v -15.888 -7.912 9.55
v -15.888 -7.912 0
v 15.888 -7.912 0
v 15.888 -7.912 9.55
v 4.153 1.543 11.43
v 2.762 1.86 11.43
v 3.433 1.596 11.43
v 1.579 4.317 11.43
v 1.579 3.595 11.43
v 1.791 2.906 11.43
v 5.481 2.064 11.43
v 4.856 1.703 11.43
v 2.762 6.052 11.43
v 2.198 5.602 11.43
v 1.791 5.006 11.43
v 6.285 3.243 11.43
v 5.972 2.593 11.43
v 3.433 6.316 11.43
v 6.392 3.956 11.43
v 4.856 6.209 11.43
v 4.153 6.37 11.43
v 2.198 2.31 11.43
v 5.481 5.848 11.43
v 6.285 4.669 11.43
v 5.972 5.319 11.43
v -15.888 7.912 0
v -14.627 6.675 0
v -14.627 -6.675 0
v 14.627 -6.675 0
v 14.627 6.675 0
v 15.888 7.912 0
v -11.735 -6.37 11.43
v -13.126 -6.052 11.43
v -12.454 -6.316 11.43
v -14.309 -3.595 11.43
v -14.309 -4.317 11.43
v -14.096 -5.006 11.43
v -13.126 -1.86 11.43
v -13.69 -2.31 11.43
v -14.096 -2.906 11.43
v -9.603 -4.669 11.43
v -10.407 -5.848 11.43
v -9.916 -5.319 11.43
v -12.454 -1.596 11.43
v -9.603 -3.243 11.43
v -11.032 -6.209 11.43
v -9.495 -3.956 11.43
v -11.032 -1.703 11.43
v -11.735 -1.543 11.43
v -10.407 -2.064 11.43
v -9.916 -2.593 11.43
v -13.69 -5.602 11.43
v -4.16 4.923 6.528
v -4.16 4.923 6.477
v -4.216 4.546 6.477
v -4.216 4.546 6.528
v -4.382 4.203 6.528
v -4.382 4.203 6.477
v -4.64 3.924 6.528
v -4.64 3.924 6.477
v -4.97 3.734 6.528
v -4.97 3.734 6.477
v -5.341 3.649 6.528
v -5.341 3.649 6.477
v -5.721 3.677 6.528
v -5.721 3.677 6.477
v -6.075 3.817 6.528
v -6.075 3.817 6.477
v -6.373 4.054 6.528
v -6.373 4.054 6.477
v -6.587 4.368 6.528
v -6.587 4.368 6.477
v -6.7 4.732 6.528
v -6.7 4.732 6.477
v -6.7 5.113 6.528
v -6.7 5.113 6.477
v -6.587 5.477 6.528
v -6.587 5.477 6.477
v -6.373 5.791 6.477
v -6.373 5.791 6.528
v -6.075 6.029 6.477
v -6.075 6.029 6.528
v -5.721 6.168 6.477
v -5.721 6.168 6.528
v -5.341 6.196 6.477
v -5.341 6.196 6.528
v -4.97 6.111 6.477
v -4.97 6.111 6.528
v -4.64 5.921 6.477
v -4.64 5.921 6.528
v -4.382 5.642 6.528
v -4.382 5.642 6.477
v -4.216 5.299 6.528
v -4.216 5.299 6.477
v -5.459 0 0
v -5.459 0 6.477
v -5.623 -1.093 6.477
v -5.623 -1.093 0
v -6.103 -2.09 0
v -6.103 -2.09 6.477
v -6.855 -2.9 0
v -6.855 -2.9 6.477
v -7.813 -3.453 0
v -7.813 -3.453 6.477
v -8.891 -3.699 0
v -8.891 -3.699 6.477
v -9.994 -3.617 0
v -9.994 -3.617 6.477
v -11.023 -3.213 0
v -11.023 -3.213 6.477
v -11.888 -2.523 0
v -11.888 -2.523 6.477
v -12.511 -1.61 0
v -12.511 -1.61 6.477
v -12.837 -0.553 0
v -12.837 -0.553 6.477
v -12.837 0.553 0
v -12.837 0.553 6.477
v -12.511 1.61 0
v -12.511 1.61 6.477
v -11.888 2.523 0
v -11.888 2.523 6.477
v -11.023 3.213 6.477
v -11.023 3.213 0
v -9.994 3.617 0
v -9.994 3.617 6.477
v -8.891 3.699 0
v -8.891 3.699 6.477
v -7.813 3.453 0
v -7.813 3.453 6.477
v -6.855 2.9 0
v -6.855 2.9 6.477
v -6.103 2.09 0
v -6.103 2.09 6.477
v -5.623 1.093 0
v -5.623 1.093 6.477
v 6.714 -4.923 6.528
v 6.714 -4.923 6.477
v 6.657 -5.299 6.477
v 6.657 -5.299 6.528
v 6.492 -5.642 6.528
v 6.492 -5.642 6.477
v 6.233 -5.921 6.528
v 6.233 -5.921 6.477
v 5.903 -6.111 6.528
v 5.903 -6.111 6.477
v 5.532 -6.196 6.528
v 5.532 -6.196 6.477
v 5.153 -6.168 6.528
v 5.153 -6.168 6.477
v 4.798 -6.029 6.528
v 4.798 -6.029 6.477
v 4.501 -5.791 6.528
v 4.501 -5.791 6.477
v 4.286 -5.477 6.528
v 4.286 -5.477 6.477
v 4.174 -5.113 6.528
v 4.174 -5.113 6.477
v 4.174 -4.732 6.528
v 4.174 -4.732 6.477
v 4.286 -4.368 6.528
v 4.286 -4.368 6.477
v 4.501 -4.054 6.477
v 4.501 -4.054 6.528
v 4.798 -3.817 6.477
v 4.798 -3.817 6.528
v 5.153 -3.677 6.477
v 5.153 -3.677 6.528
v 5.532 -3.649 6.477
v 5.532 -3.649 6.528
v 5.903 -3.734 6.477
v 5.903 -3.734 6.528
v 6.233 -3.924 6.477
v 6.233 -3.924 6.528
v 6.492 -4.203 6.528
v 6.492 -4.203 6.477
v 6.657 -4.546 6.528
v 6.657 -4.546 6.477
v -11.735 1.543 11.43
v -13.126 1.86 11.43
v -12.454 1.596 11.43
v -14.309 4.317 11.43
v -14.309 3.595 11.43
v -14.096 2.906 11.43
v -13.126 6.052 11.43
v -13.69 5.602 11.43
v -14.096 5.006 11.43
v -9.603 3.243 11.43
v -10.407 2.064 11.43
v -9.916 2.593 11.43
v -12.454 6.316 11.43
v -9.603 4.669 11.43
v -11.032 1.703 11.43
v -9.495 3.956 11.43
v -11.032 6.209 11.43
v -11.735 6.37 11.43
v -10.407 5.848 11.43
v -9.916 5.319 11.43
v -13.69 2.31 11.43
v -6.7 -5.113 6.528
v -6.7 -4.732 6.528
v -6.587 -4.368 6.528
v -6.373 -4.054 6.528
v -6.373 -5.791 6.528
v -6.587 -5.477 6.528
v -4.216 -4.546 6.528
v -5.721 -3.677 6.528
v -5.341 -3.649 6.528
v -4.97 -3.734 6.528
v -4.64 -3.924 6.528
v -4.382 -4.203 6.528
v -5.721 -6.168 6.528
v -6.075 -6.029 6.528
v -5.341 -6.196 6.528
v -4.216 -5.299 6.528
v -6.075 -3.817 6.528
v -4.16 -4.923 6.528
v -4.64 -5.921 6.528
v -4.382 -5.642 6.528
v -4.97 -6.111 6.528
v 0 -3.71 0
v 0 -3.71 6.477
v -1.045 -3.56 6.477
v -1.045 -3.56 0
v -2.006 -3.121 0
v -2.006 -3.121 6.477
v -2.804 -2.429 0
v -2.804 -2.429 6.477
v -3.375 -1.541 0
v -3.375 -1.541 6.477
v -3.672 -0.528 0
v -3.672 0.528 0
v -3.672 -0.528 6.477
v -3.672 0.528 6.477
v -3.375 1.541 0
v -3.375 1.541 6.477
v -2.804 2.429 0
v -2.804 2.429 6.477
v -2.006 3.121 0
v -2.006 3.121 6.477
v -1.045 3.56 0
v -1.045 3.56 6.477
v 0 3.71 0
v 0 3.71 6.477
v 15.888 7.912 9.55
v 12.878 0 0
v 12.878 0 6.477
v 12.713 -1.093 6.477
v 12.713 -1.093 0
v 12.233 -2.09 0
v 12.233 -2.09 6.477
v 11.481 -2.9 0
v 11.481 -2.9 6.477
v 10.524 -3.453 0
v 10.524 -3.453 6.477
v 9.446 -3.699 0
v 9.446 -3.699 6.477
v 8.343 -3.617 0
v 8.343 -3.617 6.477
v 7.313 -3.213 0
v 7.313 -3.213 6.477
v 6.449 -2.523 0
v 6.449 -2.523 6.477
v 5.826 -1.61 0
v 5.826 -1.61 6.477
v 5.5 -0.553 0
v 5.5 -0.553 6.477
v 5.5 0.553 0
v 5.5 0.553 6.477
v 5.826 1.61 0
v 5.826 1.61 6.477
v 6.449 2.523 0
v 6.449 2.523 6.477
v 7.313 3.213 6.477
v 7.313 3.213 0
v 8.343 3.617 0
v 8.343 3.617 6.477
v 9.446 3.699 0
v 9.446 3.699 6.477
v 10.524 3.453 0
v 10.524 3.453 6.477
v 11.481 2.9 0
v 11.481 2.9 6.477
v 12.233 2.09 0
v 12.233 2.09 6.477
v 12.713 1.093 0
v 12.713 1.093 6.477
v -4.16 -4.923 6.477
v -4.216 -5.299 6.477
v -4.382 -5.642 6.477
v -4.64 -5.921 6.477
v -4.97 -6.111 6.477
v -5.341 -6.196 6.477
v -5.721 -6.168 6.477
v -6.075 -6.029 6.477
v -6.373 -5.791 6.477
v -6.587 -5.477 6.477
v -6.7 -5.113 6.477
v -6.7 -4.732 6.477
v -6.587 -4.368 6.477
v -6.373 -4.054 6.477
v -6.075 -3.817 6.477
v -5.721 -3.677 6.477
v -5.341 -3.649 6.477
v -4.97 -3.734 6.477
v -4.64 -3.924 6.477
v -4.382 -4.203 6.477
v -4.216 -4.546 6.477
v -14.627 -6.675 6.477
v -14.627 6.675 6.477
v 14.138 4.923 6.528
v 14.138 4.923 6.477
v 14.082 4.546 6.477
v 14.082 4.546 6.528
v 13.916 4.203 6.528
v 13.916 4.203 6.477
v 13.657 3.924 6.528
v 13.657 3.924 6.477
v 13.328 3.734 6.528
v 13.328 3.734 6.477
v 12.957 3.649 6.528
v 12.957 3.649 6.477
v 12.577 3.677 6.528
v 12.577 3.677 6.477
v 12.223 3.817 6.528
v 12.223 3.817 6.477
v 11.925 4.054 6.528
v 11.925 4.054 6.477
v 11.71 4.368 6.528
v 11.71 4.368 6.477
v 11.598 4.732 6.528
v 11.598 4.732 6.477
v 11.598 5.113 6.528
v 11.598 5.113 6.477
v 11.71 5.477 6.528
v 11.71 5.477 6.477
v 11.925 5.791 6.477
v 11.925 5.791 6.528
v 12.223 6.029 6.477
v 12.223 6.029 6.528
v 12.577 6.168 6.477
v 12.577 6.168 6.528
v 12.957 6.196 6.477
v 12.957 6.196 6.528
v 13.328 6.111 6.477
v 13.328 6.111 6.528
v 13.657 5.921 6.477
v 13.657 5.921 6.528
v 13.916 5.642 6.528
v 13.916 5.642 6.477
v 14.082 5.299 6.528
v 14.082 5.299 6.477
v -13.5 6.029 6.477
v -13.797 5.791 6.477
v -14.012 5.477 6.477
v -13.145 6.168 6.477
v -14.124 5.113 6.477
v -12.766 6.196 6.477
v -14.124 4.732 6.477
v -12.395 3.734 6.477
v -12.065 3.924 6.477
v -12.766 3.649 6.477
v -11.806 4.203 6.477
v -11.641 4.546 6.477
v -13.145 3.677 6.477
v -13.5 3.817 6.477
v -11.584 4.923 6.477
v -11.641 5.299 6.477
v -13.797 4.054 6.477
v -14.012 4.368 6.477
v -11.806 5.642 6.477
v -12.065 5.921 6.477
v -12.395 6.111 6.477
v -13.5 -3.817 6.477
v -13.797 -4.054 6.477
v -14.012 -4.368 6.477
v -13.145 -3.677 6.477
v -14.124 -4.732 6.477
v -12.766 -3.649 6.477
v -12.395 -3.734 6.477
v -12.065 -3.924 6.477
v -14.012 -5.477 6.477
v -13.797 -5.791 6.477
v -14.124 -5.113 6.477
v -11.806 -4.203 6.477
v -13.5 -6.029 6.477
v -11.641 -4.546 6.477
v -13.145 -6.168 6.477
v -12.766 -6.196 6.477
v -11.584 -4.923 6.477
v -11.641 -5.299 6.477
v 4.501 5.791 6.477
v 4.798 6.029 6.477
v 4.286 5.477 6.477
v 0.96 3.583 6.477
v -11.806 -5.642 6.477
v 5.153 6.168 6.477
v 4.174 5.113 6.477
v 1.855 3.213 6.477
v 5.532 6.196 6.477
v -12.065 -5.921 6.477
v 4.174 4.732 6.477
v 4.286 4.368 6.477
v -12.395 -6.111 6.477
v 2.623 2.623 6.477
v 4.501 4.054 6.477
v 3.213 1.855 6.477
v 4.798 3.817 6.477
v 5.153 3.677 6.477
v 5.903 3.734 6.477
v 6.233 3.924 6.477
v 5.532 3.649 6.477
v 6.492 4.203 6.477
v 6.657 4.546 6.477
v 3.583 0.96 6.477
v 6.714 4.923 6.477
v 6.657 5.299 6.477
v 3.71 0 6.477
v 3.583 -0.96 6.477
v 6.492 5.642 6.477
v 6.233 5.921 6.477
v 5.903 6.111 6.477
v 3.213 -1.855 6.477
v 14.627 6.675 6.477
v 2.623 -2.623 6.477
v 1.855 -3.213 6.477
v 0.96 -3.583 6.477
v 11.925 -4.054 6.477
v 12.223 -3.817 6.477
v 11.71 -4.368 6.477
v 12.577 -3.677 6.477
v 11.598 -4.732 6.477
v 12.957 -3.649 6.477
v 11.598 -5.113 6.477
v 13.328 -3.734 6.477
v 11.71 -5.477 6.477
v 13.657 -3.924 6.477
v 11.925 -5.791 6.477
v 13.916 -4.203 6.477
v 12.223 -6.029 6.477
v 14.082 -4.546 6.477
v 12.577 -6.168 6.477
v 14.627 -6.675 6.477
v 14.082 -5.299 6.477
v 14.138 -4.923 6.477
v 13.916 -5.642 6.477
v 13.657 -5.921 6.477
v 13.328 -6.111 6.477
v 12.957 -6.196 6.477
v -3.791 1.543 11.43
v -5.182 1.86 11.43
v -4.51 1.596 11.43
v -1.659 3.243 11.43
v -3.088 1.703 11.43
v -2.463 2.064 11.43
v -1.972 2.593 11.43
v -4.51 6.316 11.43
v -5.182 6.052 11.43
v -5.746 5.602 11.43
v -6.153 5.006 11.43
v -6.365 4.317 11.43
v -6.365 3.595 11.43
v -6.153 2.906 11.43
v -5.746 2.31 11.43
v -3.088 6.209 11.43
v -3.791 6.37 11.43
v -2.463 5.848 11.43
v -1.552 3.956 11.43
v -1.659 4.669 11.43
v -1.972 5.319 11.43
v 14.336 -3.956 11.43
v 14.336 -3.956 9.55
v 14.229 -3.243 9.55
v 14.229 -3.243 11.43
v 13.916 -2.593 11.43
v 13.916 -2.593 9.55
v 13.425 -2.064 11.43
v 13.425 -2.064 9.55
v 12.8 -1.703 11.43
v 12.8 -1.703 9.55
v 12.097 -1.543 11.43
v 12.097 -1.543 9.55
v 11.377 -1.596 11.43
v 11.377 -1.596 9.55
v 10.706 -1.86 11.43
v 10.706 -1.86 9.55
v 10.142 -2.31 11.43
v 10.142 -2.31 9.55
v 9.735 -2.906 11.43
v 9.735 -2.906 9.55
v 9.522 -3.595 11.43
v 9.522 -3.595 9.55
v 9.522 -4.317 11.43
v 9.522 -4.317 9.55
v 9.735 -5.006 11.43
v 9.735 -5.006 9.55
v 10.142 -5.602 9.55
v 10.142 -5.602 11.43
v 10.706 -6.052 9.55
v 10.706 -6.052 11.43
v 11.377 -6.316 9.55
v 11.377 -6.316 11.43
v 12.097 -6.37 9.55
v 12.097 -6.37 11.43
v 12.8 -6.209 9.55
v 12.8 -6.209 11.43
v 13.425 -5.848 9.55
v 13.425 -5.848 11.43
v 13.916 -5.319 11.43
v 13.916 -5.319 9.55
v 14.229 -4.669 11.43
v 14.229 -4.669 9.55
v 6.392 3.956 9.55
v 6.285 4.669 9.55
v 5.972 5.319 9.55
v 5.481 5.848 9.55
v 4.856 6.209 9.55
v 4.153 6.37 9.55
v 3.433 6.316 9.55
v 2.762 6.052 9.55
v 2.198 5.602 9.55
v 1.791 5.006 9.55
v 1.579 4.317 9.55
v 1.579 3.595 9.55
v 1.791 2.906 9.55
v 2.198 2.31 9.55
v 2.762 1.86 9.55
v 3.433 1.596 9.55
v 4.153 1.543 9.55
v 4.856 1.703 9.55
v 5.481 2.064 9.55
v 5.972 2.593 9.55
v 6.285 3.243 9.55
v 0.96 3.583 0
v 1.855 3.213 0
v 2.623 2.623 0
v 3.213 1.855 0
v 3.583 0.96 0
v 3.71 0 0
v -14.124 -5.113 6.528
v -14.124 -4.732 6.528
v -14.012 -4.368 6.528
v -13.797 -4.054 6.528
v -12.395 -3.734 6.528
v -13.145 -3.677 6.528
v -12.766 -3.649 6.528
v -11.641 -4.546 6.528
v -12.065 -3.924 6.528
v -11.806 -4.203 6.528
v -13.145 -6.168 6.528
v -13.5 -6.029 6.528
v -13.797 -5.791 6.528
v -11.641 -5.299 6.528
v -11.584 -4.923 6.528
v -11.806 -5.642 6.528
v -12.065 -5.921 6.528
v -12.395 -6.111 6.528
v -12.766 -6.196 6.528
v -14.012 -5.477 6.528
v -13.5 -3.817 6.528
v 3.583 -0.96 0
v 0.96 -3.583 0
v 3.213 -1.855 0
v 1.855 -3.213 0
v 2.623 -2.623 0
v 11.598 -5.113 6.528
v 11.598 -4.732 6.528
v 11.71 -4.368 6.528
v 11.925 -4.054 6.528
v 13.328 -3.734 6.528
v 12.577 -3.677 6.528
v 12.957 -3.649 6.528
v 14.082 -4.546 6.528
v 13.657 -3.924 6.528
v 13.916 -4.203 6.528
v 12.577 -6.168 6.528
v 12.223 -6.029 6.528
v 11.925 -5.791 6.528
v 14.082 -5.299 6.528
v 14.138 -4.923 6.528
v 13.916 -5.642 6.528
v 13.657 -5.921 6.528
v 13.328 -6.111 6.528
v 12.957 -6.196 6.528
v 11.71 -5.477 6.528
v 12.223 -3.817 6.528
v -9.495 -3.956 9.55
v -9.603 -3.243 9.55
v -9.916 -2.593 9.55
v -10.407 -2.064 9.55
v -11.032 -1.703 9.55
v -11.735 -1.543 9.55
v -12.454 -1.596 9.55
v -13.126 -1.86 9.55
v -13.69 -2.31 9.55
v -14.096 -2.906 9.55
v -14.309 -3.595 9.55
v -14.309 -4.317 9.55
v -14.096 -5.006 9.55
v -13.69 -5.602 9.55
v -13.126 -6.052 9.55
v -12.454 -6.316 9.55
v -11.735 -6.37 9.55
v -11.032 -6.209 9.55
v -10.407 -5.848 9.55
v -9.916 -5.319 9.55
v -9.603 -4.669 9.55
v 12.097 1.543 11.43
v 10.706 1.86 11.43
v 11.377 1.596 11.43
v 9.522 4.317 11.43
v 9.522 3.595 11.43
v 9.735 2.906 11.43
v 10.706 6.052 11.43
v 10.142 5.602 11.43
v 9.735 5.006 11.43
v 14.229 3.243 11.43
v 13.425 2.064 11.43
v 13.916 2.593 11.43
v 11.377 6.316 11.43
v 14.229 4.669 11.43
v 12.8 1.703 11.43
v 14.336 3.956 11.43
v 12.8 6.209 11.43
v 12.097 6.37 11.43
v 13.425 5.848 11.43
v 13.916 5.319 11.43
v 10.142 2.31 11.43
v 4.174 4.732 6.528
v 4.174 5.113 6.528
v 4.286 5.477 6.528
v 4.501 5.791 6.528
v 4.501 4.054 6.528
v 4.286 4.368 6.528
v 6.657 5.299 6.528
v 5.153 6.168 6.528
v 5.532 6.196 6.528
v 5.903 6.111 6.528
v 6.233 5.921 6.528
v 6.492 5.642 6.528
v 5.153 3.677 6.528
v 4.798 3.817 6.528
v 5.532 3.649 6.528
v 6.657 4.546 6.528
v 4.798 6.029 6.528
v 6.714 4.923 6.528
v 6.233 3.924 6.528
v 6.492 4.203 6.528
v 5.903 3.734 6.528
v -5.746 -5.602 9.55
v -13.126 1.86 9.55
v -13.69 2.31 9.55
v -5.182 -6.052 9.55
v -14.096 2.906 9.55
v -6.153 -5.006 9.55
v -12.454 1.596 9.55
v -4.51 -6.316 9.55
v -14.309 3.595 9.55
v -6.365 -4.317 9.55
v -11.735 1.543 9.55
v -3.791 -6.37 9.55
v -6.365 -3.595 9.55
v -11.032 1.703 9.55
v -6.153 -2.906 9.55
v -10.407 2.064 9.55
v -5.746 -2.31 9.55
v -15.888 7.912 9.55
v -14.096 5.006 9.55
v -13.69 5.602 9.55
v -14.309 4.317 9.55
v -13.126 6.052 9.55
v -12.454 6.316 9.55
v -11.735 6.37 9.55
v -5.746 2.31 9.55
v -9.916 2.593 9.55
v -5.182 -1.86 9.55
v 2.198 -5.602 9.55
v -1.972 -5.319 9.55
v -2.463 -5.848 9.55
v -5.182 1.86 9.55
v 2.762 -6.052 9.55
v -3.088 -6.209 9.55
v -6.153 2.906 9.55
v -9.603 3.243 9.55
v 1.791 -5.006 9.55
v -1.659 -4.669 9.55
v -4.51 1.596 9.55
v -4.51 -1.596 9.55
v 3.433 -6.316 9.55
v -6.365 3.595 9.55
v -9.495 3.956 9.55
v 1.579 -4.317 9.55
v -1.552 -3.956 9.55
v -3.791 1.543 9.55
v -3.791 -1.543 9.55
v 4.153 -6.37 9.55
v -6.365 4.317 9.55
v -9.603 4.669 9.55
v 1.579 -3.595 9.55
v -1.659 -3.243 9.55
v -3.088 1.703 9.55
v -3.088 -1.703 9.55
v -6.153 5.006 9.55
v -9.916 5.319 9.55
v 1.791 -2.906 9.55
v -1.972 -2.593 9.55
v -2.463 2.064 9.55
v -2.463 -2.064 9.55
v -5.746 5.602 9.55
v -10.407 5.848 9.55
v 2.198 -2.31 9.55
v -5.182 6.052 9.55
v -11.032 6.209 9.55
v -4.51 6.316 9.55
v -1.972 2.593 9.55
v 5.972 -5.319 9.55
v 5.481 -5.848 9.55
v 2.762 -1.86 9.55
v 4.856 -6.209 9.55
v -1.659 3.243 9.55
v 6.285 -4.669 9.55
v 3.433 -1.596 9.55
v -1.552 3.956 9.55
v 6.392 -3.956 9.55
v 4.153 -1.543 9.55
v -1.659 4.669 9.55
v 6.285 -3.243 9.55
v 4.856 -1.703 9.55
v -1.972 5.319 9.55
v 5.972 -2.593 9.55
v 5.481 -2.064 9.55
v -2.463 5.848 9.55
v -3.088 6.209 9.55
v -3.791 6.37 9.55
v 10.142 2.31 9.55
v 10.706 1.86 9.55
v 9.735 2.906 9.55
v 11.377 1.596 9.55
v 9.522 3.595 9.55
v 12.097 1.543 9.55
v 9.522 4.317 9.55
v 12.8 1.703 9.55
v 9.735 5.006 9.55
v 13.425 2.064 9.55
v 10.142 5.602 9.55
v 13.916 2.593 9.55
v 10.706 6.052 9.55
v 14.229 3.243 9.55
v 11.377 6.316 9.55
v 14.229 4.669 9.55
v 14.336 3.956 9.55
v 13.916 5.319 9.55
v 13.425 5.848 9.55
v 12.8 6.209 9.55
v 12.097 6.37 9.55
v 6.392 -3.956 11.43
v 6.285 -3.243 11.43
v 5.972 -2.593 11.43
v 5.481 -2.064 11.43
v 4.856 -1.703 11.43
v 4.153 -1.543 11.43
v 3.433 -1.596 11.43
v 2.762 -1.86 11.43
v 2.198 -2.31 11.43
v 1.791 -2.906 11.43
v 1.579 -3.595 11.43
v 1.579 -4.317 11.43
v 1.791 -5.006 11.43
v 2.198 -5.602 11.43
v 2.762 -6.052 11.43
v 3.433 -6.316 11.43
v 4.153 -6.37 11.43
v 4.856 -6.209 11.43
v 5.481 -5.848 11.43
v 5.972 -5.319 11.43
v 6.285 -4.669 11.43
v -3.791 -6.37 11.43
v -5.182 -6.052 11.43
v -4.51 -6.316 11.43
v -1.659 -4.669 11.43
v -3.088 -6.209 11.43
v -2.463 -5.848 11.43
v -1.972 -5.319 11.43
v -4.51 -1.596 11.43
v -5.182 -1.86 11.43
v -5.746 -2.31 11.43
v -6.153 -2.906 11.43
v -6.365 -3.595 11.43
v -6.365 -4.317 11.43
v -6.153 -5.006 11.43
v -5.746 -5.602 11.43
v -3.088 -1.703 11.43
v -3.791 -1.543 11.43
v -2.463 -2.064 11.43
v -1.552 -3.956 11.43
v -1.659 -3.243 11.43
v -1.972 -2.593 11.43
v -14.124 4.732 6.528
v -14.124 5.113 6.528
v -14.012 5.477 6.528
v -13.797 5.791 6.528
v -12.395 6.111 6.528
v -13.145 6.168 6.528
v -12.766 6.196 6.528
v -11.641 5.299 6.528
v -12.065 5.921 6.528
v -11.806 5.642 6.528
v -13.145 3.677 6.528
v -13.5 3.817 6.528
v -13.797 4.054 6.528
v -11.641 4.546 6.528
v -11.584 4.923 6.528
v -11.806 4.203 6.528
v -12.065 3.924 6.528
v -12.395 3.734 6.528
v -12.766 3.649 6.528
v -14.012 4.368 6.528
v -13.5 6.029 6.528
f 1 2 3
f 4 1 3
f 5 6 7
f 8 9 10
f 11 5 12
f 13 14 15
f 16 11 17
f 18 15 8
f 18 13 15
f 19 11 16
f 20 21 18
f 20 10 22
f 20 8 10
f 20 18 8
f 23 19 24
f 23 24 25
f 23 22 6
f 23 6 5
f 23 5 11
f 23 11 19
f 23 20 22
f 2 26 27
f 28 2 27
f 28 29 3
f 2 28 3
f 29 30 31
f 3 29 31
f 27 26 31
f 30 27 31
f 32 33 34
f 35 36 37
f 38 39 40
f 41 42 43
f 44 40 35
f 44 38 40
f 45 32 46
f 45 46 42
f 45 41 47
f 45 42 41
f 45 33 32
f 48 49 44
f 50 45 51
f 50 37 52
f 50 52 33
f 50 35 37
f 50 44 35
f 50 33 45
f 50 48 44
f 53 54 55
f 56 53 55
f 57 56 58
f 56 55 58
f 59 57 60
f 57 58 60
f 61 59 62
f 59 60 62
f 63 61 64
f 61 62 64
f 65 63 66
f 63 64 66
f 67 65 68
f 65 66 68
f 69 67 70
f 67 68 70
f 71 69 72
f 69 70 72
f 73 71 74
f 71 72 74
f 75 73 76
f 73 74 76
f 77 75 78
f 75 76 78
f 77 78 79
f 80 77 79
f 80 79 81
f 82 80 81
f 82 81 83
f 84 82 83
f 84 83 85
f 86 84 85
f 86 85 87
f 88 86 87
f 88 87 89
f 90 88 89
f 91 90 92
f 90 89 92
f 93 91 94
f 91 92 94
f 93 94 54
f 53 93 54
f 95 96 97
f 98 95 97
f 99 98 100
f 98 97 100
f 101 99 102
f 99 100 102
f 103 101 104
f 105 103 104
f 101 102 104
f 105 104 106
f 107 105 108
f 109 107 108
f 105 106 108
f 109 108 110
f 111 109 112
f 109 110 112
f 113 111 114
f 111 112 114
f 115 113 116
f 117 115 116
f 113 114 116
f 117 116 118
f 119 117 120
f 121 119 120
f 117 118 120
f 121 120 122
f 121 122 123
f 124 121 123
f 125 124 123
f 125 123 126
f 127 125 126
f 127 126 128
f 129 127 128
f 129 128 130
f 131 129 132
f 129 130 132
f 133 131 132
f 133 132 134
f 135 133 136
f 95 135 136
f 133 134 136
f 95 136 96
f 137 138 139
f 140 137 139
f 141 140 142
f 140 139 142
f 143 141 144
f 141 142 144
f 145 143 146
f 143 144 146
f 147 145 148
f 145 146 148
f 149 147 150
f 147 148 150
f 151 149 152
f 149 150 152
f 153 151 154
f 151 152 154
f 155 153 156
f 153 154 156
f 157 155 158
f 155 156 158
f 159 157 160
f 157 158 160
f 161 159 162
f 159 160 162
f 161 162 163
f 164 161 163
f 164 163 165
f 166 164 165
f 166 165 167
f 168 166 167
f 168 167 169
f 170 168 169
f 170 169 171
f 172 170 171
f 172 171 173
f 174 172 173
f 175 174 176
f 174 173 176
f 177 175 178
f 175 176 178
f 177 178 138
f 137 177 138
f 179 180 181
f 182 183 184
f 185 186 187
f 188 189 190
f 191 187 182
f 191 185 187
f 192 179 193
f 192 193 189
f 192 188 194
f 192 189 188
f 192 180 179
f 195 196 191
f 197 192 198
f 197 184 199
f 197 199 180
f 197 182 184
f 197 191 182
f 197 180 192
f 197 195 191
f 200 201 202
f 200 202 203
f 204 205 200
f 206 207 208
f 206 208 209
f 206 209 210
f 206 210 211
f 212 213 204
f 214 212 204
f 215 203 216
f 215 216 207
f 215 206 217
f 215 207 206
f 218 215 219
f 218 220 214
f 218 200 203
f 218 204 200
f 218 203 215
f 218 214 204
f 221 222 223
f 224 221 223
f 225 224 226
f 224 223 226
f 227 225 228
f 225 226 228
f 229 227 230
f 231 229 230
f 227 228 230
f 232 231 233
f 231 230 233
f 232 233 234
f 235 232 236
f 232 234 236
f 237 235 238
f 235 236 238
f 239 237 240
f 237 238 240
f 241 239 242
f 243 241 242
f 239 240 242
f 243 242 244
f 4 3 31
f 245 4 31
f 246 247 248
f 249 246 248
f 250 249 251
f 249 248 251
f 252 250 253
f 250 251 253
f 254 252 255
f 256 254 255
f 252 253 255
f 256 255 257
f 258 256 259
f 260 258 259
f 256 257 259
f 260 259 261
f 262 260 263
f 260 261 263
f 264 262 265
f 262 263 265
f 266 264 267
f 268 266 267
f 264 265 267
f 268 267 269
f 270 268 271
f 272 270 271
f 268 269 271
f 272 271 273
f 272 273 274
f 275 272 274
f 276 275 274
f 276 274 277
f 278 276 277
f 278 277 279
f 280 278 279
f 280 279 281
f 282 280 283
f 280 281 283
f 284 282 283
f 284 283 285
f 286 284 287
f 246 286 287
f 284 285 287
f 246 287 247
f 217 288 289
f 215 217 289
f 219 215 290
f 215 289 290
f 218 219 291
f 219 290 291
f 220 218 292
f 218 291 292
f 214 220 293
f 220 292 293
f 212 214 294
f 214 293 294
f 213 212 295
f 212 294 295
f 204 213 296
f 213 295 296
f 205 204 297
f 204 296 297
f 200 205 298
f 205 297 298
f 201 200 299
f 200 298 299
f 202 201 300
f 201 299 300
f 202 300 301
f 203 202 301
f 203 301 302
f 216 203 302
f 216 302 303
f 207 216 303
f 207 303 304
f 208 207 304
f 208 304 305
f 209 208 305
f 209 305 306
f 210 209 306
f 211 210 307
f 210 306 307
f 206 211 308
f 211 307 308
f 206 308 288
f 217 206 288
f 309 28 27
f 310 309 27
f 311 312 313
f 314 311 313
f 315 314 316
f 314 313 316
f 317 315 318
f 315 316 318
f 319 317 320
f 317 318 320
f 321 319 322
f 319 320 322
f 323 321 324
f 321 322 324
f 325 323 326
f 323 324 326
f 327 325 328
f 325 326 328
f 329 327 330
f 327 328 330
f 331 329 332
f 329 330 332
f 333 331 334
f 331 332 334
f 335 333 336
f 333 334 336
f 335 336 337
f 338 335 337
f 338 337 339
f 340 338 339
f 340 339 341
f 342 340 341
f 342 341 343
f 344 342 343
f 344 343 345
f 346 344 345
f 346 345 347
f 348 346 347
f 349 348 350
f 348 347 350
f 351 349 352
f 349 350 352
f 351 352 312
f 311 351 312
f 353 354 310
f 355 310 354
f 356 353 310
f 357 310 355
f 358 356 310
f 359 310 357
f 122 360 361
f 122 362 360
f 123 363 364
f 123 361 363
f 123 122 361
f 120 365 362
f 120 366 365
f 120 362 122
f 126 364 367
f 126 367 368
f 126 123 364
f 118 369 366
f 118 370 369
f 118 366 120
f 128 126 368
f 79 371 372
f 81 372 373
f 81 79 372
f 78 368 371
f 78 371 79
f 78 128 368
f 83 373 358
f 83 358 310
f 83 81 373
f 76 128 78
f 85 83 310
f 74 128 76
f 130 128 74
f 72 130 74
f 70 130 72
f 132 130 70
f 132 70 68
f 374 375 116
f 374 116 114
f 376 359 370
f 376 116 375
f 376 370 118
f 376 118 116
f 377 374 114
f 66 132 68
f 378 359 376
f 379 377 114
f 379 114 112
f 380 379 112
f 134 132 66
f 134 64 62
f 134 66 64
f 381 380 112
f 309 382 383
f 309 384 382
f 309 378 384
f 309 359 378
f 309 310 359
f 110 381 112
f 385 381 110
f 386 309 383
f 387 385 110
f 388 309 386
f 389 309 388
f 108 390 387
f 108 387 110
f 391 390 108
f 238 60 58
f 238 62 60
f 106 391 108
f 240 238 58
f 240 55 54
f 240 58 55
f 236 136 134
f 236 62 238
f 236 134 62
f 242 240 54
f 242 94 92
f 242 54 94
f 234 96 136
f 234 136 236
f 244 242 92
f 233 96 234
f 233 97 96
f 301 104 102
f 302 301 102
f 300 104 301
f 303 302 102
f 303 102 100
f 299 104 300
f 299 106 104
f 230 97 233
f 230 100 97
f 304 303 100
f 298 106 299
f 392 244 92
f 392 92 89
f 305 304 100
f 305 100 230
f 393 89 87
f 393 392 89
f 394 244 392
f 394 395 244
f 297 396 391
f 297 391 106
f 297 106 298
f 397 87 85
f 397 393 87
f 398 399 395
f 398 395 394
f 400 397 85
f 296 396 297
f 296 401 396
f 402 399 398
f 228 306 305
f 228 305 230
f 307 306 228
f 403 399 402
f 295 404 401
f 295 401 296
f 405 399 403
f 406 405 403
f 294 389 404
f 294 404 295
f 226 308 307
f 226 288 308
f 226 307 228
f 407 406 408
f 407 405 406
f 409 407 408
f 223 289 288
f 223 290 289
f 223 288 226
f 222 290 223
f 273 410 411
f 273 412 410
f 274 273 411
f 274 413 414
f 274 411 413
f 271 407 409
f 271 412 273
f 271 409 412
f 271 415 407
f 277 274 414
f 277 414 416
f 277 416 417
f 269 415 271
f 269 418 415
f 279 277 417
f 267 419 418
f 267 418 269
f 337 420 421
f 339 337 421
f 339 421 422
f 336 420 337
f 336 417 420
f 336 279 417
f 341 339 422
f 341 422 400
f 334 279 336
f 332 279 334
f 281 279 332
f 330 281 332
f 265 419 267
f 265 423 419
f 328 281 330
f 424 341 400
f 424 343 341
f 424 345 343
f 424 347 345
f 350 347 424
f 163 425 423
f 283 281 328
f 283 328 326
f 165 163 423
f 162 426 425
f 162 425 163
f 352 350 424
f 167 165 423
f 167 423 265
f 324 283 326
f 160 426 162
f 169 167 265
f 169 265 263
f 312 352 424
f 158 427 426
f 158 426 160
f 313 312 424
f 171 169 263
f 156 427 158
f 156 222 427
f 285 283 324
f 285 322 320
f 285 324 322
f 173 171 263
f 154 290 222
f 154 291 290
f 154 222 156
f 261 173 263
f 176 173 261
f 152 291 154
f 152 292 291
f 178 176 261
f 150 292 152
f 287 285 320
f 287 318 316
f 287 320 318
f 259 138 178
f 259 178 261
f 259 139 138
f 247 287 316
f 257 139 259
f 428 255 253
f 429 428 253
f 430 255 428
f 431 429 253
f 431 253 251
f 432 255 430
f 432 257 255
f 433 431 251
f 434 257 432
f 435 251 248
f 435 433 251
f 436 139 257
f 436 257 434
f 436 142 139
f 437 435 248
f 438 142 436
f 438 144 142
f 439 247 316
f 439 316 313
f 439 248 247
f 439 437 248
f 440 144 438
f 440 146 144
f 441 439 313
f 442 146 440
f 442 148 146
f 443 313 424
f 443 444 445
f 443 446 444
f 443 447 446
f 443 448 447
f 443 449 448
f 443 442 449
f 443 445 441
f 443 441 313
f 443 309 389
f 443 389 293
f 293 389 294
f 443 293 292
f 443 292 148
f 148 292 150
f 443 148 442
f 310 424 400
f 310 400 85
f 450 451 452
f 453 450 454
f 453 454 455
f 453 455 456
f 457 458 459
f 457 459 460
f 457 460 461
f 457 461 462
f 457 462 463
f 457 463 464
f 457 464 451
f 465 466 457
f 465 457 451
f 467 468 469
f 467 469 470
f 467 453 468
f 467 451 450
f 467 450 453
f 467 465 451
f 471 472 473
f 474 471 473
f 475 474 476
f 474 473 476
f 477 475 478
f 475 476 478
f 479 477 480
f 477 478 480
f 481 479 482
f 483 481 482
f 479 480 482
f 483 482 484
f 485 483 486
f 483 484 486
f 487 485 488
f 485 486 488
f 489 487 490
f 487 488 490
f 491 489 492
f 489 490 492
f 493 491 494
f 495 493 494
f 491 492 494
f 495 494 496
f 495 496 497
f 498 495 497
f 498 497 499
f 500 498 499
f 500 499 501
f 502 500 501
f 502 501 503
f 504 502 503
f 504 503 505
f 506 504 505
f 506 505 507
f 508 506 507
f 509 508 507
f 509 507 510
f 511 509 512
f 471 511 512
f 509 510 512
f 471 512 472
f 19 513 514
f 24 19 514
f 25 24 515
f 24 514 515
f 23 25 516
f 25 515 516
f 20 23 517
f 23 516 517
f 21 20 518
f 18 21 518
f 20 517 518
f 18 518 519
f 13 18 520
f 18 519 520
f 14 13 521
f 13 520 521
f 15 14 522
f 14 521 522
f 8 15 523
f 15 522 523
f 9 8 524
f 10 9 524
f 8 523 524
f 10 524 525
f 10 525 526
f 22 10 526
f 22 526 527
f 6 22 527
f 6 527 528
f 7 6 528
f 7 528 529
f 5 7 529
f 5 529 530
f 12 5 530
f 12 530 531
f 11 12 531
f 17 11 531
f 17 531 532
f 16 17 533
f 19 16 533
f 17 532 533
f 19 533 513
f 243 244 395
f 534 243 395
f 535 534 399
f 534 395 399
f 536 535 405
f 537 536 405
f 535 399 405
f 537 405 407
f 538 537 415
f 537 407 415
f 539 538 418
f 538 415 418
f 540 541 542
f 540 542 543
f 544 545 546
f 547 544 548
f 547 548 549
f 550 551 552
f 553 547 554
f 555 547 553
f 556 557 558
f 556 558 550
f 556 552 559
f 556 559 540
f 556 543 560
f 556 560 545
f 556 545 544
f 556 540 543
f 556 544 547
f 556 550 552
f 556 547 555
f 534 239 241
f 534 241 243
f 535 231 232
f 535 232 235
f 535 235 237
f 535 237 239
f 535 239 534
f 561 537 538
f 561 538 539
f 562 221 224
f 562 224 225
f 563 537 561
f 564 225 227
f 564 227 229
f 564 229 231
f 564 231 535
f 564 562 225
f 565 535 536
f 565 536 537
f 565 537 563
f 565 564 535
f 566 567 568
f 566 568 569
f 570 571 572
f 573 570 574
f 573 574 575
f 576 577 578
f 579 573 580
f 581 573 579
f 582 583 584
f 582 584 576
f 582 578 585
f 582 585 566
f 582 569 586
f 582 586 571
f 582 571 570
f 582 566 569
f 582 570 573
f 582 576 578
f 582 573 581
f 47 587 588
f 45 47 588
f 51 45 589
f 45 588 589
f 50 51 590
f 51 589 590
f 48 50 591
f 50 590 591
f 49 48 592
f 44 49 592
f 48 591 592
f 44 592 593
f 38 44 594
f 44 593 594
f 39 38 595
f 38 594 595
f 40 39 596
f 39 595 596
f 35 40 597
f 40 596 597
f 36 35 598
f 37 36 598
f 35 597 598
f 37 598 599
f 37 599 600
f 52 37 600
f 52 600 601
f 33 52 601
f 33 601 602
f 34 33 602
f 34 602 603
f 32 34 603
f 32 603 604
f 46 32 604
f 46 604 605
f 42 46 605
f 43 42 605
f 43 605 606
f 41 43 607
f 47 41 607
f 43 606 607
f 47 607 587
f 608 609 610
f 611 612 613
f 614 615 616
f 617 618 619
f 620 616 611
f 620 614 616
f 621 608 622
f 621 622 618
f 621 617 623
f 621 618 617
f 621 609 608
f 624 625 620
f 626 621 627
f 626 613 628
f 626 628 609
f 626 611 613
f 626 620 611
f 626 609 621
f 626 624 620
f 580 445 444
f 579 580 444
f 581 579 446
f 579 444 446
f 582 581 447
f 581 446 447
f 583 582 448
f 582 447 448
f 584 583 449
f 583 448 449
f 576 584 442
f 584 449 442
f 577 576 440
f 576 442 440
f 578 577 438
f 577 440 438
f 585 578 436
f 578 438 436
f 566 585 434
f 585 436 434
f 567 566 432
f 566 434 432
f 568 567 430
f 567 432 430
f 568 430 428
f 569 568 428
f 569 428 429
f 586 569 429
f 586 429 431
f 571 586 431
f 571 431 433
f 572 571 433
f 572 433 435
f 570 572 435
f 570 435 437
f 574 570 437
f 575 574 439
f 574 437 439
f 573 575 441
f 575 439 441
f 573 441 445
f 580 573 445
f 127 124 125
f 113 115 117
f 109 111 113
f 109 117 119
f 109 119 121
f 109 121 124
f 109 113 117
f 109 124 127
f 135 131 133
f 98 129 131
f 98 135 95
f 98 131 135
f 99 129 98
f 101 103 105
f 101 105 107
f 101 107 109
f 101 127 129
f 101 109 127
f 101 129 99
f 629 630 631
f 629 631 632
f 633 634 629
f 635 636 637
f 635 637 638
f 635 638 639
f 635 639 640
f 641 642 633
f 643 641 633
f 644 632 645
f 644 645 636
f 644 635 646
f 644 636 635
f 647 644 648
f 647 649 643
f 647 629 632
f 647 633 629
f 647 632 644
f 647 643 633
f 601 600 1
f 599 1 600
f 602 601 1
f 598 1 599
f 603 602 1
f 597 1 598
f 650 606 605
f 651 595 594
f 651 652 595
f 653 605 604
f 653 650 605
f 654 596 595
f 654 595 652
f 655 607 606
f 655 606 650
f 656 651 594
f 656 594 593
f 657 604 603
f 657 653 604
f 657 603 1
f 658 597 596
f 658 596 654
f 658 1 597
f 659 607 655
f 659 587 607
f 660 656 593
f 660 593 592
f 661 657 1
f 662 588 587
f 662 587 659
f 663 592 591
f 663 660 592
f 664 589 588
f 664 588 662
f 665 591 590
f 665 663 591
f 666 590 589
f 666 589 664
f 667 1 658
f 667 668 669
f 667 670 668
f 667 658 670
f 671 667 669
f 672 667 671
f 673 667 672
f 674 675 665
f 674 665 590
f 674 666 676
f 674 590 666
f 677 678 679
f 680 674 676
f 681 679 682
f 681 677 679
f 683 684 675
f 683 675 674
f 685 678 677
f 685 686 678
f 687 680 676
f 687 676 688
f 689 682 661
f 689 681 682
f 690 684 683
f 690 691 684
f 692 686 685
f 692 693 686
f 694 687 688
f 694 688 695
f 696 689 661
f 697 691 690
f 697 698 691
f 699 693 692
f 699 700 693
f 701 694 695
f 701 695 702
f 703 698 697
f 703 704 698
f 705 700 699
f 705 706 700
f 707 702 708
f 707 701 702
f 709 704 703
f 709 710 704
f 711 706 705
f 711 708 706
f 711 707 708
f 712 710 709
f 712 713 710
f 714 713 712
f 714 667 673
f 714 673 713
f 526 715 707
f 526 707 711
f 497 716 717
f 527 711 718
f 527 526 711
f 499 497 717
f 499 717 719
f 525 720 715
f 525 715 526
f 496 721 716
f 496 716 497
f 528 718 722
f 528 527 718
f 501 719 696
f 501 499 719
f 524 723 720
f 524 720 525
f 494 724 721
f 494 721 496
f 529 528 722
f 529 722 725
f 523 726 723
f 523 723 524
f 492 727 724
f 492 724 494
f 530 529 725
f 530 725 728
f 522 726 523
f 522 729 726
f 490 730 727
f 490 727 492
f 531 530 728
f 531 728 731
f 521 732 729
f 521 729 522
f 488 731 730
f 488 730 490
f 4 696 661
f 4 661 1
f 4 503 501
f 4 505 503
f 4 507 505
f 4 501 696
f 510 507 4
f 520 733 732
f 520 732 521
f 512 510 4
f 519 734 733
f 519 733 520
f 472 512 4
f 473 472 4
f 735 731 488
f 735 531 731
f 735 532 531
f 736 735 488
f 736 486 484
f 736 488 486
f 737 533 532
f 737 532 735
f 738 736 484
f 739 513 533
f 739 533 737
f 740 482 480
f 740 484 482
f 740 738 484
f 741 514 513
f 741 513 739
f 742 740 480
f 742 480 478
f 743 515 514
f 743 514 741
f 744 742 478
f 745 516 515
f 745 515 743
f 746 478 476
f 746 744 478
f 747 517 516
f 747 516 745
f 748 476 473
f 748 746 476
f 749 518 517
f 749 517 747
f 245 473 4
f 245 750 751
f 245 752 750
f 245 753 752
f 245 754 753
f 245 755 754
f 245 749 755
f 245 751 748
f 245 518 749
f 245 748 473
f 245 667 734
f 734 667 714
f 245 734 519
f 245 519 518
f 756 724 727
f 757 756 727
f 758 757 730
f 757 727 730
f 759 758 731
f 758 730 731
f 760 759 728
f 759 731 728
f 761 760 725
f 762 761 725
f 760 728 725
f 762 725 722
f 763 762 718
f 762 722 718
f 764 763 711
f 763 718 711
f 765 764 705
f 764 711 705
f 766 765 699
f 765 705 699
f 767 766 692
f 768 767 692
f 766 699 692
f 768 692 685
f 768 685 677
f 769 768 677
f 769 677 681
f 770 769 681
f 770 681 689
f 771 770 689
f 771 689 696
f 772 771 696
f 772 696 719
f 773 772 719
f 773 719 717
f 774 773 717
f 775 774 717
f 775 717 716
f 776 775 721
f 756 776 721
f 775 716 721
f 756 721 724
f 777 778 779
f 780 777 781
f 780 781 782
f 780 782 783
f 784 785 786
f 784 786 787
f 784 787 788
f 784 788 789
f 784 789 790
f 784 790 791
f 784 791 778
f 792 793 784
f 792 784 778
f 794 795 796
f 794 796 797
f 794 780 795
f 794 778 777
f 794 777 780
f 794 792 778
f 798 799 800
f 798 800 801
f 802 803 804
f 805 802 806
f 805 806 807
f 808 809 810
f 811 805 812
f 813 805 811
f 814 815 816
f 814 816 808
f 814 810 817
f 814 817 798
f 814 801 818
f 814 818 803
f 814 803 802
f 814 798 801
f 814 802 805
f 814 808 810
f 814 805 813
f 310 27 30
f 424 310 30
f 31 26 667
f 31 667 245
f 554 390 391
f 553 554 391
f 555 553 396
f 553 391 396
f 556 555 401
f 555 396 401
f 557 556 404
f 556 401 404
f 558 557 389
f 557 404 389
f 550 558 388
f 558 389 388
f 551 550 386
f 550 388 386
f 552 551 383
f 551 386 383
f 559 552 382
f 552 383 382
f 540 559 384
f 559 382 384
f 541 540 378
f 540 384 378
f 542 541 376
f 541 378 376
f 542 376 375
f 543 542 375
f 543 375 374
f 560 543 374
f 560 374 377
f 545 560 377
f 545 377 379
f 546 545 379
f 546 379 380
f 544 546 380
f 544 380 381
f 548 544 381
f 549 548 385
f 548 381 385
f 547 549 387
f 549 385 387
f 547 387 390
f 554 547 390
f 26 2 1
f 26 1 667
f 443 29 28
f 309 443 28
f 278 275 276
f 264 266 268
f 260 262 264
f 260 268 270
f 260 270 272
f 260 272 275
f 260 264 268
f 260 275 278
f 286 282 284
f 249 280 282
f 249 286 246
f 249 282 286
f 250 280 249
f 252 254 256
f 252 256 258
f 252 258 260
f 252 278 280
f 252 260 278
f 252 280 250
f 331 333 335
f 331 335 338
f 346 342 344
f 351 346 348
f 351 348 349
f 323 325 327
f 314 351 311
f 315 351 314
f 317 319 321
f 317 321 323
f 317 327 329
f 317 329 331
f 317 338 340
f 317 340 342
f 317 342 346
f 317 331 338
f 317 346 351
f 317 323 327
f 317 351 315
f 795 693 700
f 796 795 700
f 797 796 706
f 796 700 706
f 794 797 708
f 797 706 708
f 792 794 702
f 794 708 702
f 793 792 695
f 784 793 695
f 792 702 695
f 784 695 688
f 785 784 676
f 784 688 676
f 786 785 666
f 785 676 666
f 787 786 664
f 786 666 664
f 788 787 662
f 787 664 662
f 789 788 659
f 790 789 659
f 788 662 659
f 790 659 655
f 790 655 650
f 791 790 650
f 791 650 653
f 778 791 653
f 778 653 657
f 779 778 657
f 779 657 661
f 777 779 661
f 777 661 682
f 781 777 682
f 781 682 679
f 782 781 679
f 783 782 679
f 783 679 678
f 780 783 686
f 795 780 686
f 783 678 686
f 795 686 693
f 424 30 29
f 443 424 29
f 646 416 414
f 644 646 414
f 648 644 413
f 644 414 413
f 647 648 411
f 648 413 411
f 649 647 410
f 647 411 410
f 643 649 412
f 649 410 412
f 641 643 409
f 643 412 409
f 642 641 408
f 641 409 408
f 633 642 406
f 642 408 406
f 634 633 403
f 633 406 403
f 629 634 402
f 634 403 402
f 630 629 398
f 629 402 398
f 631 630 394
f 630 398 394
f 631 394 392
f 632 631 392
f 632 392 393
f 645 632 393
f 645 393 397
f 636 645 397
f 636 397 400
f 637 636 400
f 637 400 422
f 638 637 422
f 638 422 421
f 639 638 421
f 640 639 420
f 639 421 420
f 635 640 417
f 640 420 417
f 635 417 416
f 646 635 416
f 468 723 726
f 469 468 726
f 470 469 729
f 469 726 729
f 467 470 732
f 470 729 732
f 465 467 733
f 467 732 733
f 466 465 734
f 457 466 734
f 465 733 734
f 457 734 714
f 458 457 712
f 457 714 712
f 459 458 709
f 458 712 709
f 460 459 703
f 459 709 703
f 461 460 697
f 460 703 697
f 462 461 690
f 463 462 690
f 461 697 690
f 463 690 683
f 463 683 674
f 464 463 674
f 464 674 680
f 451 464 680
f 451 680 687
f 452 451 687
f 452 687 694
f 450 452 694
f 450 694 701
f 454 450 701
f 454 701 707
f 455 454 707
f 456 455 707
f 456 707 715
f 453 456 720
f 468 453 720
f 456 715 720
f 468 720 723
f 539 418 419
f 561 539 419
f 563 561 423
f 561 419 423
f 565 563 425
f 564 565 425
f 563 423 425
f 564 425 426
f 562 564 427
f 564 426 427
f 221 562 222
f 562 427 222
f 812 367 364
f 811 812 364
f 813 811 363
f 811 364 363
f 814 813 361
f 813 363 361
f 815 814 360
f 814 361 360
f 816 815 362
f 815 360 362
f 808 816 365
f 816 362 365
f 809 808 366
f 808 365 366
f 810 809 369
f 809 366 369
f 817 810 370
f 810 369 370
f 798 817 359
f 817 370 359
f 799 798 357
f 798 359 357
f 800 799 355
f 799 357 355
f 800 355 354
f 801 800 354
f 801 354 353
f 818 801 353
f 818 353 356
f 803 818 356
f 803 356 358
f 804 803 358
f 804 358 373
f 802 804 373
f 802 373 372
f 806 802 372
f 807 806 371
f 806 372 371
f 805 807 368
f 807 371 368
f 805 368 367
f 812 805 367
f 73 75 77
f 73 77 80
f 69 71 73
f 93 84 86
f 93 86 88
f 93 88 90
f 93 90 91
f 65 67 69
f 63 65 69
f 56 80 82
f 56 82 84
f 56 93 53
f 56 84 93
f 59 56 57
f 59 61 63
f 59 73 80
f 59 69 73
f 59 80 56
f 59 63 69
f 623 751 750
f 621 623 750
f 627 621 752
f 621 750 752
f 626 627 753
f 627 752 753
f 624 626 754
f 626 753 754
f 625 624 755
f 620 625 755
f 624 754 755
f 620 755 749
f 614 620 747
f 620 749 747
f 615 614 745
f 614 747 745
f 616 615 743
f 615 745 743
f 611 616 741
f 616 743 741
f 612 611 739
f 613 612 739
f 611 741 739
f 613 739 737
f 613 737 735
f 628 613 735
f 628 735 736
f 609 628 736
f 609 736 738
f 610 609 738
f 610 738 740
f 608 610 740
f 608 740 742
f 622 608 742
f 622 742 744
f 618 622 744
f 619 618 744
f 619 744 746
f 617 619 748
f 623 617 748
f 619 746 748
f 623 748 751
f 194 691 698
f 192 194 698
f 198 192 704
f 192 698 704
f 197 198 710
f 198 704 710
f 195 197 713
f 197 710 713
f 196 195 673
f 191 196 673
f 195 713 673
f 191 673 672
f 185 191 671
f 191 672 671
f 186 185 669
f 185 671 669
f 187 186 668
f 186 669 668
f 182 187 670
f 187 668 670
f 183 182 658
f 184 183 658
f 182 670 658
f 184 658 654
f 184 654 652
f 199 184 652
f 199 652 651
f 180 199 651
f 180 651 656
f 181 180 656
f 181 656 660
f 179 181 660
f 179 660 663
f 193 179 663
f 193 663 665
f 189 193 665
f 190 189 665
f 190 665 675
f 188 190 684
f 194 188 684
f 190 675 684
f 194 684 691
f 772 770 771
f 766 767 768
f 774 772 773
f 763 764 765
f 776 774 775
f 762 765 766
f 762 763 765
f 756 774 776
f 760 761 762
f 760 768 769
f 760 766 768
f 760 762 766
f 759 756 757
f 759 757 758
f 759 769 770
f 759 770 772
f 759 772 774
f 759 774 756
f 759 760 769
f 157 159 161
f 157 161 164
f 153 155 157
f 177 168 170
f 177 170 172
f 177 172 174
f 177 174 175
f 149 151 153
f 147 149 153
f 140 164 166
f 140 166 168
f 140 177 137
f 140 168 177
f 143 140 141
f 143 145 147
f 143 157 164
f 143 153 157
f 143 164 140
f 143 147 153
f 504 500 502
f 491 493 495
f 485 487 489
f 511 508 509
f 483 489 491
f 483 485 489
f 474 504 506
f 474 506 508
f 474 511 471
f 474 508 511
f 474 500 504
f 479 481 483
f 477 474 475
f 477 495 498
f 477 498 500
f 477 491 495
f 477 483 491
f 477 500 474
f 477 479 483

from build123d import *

# Parameters (mm, degrees)
F0_W     = 31.7754
F0_H     = 15.8242
F1_DEPTH = 9.5504
F2_R     = 2.420309
F3_DEPTH = 1.8796
F5_DEPTH = 6.477
F6_R     = 3.709792
F7_DEPTH = 6.477
F8_R     = 1.277131
F9_DEPTH = 0.0508


with BuildPart() as f1:
    # F0 (on Top) → F1 (new body)
    with BuildSketch(Plane.XY):
        Rectangle(F0_W, F0_H)
    extrude(amount=F1_DEPTH)

    # F2 (on face) → F3 (join)
    with BuildSketch(Plane.XY.offset(9.5504)):
        with Locations((-11.915775, 3.95605)):
            Circle(F2_R)
        with Locations((-3.971925, 3.95605)):
            Circle(F2_R)
        with Locations((3.971925, 3.95605)):
            Circle(F2_R)
        with Locations((11.915775, 3.95605)):
            Circle(F2_R)
        with Locations((11.915775, -3.95605)):
            Circle(F2_R)
        with Locations((3.971925, -3.95605)):
            Circle(F2_R)
        with Locations((-3.971925, -3.95605)):
            Circle(F2_R)
        with Locations((-11.915775, -3.95605)):
            Circle(F2_R)
    extrude(amount=F3_DEPTH)

    # F4 (on face) → F5 (cut)
    with BuildSketch(Plane(origin=(0, 0, 0), x_dir=(1, 0, 0), z_dir=(0, 0, -1))):
        Polygon((14.626832, 6.675115), (-12.304062, 6.675115), (-14.626832, 6.675115), (-14.626832, -6.675115), (14.626832, -6.675115), align=None)
    extrude(amount=-F5_DEPTH, mode=Mode.SUBTRACT)

    # F6 (on face) → F7 (join)
    with BuildSketch(Plane(origin=(0, 0, 6.477), x_dir=(1, 0, 0), z_dir=(0, 0, -1))):
        with Locations((-9.168312, 0)):
            Circle(F6_R)
        with BuildLine():
            ThreePointArc((0, -3.709792), (2.623219, -2.623219), (3.709792, 0))
            ThreePointArc((3.709792, 0), (2.623219, 2.623219), (0, 3.709792))
            ThreePointArc((0, 3.709792), (-3.709792, 0), (0, -3.709792))
        make_face()
        with Locations((9.168312, 0)):
            Circle(F6_R)
    extrude(amount=F7_DEPTH)

    # F8 (on face) → F9 (cut)
    with BuildSketch(Plane(origin=(0, 0, 6.477), x_dir=(1, 0, 0), z_dir=(0, 0, -1))):
        with Locations((-12.861121, 4.922554)):
            Circle(F8_R)
        with Locations((-5.436716, 4.922554)):
            Circle(F8_R)
        with Locations((5.436716, 4.922554)):
            Circle(F8_R)
        with Locations((12.861121, 4.922554)):
            Circle(F8_R)
        with Locations((12.861121, -4.922554)):
            Circle(F8_R)
        with Locations((5.436716, -4.922554)):
            Circle(F8_R)
        with Locations((-5.436716, -4.922554)):
            Circle(F8_R)
        with Locations((-12.861121, -4.922554)):
            Circle(F8_R)
    extrude(amount=-F9_DEPTH, mode=Mode.SUBTRACT)


solid = f1.part
